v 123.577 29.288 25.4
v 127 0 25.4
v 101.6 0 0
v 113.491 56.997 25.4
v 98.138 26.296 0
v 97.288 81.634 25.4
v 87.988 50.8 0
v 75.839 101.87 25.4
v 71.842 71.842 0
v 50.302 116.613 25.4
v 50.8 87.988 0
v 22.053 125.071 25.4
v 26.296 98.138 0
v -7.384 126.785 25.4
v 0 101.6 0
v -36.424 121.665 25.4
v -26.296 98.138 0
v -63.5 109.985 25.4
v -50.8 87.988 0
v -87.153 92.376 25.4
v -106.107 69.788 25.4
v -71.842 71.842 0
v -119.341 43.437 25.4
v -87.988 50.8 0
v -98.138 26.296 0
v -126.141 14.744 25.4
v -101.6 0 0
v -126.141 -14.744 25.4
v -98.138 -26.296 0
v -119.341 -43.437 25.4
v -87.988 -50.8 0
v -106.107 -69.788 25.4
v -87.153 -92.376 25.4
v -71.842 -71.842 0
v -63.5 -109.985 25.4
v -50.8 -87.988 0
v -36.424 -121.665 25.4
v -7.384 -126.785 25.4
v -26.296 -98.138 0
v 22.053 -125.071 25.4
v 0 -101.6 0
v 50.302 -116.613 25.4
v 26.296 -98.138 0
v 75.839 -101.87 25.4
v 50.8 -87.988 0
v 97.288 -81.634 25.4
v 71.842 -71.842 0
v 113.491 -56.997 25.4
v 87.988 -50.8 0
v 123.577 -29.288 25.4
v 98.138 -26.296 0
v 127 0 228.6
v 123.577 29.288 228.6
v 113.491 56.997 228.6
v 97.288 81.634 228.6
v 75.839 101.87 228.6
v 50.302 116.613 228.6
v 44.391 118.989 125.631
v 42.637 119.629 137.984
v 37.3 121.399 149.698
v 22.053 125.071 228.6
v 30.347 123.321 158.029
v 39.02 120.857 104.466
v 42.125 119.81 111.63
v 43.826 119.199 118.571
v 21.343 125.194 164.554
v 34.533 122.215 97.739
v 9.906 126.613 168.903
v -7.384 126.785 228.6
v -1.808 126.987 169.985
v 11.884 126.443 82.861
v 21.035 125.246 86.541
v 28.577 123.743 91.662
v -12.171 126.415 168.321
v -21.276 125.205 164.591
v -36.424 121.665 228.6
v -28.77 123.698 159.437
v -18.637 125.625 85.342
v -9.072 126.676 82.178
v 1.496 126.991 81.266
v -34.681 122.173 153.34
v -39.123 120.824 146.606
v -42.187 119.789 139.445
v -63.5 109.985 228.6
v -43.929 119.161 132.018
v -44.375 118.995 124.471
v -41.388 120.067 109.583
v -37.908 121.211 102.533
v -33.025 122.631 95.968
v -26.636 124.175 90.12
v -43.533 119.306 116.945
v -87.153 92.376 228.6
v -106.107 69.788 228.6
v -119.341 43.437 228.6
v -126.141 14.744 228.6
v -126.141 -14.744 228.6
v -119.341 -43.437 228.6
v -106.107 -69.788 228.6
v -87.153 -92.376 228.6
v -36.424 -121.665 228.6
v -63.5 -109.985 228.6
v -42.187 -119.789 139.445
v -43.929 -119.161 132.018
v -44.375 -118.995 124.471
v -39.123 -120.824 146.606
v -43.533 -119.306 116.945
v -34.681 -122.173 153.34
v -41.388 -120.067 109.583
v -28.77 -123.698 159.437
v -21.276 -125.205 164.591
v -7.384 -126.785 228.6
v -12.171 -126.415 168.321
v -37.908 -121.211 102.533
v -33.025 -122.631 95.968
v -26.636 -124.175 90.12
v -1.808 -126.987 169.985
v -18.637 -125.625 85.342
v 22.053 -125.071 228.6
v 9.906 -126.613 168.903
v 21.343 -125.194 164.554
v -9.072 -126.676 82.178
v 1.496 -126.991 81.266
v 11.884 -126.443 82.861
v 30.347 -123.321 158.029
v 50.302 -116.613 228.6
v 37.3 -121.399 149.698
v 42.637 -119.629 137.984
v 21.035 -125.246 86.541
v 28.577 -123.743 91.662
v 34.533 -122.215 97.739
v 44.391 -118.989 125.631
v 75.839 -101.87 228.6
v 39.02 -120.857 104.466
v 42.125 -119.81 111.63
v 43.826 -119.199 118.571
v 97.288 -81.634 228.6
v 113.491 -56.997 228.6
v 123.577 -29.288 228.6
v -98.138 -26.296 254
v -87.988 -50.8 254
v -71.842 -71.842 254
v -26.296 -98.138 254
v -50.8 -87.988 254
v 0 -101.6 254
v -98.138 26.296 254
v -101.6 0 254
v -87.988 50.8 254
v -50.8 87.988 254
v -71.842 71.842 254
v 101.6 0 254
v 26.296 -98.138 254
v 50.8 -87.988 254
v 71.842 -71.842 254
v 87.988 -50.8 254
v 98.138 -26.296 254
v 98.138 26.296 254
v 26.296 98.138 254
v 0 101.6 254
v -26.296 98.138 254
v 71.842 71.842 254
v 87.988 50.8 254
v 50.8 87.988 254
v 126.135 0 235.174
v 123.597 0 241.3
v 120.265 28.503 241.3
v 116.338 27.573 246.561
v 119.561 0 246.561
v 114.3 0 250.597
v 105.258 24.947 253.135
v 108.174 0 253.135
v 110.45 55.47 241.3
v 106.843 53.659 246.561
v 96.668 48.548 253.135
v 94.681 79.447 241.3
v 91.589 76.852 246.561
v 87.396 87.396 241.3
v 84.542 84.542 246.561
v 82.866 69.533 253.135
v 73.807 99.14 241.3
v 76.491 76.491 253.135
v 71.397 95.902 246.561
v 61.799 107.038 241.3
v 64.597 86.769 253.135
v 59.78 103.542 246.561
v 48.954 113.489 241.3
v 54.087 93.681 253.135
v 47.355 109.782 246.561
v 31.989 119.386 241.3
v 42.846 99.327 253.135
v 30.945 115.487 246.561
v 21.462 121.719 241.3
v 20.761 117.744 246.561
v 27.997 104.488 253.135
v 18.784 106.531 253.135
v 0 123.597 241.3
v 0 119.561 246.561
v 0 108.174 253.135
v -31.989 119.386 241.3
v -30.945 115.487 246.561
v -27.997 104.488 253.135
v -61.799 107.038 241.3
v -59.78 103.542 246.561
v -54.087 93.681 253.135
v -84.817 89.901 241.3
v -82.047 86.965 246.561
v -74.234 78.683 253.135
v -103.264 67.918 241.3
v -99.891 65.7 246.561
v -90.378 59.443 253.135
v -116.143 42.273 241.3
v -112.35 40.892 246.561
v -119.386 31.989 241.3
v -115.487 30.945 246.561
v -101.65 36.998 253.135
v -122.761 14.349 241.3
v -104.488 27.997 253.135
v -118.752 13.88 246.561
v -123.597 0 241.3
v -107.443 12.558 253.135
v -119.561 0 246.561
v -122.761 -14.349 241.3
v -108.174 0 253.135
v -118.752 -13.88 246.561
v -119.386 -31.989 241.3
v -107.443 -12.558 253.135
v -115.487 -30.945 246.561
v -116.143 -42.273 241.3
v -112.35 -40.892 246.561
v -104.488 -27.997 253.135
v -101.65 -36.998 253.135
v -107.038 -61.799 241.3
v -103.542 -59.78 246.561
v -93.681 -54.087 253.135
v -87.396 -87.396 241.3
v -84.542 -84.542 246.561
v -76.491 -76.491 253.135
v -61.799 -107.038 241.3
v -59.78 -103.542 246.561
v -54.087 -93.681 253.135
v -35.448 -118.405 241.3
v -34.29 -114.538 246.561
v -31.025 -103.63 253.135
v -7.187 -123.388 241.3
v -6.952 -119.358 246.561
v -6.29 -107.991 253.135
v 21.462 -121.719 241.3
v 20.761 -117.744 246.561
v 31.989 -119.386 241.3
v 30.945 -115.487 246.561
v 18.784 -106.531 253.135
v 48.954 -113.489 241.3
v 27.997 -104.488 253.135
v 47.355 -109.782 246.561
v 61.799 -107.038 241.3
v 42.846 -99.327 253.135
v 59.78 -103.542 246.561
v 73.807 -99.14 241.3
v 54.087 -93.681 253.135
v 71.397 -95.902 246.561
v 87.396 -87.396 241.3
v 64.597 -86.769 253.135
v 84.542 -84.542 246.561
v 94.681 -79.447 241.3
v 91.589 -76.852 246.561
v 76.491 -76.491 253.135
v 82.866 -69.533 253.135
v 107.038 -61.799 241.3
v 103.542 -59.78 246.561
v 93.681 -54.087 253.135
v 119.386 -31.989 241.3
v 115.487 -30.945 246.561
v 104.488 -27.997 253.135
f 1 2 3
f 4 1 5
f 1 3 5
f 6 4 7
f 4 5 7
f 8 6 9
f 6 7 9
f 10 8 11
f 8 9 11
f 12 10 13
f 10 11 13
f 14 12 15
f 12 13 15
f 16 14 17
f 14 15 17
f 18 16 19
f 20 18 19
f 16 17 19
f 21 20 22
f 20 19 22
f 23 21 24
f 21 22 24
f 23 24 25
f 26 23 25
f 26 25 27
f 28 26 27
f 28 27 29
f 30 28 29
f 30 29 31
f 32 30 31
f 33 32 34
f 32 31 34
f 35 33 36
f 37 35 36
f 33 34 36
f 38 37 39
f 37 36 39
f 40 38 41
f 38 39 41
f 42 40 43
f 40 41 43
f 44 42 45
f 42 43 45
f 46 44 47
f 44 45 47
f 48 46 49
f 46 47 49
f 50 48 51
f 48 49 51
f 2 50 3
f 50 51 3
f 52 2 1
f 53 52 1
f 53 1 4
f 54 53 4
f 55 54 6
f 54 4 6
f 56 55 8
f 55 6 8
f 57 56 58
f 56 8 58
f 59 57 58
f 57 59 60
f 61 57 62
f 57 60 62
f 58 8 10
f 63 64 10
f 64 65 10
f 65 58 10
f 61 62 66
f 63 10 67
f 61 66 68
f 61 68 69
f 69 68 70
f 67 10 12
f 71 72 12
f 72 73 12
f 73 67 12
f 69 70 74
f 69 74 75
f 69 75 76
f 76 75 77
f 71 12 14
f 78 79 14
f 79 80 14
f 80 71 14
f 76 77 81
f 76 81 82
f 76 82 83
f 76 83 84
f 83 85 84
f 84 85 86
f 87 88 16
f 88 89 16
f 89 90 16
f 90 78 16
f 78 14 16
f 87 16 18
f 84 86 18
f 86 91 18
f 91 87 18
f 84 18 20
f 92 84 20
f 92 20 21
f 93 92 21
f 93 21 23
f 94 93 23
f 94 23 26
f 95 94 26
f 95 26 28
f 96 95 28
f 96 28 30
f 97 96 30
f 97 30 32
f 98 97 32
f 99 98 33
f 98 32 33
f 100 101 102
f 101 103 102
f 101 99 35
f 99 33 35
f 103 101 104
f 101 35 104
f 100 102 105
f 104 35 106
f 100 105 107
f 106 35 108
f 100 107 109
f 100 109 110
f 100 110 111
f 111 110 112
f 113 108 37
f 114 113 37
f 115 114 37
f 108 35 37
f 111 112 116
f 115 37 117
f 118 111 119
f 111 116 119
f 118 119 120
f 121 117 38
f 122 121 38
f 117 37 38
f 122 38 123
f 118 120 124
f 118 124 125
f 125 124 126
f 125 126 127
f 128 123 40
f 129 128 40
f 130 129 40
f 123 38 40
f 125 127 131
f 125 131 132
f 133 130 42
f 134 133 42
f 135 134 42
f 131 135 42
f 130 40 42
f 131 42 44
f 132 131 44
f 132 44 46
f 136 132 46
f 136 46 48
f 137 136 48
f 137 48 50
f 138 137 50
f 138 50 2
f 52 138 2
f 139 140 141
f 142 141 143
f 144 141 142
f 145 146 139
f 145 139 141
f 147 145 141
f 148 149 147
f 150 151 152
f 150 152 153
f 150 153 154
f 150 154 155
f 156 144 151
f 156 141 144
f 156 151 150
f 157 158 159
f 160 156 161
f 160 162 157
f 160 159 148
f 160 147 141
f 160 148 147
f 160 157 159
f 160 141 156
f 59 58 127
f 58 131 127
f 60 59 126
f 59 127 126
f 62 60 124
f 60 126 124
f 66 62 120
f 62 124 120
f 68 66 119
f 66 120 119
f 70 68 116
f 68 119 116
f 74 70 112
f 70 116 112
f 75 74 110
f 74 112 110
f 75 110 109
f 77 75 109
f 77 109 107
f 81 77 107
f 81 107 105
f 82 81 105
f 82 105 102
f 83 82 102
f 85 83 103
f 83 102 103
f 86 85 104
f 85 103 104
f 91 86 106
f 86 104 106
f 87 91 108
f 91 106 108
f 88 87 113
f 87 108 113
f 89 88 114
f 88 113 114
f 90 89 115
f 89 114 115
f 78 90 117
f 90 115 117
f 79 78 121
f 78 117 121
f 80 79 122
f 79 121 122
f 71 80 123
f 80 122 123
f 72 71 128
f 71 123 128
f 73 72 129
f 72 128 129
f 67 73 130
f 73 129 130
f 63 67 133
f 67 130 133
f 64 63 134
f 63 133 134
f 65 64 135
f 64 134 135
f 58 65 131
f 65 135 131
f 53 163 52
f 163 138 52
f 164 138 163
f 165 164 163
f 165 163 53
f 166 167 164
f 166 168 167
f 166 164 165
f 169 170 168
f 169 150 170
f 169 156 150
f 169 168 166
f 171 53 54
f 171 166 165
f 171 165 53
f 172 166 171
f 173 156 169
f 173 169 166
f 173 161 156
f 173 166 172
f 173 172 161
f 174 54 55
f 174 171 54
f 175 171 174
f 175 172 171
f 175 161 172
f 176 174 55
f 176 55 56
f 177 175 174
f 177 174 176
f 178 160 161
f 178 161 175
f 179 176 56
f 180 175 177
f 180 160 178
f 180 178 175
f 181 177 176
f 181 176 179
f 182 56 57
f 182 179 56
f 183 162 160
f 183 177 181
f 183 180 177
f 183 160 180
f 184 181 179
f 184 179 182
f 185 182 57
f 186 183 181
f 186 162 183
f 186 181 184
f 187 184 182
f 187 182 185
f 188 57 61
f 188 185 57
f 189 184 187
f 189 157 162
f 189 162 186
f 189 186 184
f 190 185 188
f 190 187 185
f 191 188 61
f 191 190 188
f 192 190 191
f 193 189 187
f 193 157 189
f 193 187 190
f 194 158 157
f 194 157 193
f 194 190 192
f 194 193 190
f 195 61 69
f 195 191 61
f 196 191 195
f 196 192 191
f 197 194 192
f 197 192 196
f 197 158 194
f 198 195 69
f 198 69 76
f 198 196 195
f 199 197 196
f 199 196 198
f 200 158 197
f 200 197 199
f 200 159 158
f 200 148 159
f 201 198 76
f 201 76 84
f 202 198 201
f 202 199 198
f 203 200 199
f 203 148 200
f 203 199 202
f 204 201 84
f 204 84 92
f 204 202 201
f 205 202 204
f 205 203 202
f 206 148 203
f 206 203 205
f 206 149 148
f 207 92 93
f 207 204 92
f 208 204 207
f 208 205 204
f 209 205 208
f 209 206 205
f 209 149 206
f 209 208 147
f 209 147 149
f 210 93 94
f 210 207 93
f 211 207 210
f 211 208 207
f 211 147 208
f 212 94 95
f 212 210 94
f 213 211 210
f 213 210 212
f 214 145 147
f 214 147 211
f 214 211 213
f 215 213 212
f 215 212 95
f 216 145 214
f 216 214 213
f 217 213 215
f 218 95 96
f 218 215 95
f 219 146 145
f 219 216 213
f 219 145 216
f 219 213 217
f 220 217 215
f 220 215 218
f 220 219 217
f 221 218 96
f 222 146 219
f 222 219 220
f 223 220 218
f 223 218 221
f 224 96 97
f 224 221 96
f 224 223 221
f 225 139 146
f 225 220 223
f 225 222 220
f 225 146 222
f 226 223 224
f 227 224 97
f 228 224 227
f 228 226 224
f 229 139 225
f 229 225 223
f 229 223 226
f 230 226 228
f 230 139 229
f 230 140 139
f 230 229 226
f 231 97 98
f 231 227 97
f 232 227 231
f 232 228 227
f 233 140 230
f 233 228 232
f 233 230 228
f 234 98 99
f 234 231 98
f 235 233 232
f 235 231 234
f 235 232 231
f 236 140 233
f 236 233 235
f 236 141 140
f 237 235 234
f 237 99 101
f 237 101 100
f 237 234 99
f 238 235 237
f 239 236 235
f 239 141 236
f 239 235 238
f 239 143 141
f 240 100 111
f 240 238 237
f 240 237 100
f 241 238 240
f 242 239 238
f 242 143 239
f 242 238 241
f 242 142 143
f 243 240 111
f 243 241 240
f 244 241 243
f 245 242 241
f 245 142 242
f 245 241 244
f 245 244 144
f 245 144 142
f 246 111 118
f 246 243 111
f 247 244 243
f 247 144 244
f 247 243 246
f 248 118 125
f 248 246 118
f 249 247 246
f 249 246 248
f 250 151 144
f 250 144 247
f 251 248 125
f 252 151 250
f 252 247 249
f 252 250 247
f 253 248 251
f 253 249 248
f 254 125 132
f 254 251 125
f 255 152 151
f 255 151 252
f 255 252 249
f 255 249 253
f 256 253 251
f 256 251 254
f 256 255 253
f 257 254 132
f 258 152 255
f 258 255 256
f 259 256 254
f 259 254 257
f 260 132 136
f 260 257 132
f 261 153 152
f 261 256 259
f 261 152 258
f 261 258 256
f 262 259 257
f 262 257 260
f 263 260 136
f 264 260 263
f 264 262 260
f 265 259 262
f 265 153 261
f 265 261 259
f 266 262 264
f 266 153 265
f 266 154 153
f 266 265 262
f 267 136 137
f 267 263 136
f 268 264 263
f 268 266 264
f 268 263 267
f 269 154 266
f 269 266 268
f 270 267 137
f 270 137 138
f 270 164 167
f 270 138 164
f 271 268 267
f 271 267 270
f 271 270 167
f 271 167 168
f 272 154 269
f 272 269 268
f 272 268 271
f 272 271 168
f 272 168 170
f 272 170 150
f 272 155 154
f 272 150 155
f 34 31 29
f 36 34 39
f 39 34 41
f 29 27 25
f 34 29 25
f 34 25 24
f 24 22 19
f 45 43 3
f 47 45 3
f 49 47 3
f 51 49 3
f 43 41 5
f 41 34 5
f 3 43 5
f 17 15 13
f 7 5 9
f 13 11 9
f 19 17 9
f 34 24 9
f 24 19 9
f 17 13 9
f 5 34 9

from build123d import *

# Parameters (mm, degrees)
F0_R          = 127
F1_DEPTH      = 254
F2_R          = 25.4
F3_SIZE       = 25.4
F4_R          = 44.390641743
F5_DEPTH      = 127.001
F5_DEPTH_BACK = 127.001


with BuildPart() as f1:
    # F0 (on Top) → F1 (new body)
    with BuildSketch(Plane.XY):
        Circle(F0_R)
    extrude(amount=F1_DEPTH)

    # F2
    f2_edges = [f1.edges().sort_by_distance(p)[0] for p in [
        (-127, 0, 254),
    ]]
    fillet(f2_edges, radius=F2_R)

    # F3
    f3_edges = [f1.edges().sort_by_distance(p)[0] for p in [
        (-127, 0, 0),
    ]]
    chamfer(f3_edges, length=F3_SIZE)

    # F4 (on Front) → F5 (cut, two sides)
    with BuildSketch(Plane.XZ) as f5_sk:
        with Locations((0, 125.6312429905)):
            Circle(F4_R)
    extrude(amount=-F5_DEPTH, mode=Mode.SUBTRACT)
    extrude(f5_sk.sketch, amount=F5_DEPTH_BACK, mode=Mode.SUBTRACT)


solid = f1.part
